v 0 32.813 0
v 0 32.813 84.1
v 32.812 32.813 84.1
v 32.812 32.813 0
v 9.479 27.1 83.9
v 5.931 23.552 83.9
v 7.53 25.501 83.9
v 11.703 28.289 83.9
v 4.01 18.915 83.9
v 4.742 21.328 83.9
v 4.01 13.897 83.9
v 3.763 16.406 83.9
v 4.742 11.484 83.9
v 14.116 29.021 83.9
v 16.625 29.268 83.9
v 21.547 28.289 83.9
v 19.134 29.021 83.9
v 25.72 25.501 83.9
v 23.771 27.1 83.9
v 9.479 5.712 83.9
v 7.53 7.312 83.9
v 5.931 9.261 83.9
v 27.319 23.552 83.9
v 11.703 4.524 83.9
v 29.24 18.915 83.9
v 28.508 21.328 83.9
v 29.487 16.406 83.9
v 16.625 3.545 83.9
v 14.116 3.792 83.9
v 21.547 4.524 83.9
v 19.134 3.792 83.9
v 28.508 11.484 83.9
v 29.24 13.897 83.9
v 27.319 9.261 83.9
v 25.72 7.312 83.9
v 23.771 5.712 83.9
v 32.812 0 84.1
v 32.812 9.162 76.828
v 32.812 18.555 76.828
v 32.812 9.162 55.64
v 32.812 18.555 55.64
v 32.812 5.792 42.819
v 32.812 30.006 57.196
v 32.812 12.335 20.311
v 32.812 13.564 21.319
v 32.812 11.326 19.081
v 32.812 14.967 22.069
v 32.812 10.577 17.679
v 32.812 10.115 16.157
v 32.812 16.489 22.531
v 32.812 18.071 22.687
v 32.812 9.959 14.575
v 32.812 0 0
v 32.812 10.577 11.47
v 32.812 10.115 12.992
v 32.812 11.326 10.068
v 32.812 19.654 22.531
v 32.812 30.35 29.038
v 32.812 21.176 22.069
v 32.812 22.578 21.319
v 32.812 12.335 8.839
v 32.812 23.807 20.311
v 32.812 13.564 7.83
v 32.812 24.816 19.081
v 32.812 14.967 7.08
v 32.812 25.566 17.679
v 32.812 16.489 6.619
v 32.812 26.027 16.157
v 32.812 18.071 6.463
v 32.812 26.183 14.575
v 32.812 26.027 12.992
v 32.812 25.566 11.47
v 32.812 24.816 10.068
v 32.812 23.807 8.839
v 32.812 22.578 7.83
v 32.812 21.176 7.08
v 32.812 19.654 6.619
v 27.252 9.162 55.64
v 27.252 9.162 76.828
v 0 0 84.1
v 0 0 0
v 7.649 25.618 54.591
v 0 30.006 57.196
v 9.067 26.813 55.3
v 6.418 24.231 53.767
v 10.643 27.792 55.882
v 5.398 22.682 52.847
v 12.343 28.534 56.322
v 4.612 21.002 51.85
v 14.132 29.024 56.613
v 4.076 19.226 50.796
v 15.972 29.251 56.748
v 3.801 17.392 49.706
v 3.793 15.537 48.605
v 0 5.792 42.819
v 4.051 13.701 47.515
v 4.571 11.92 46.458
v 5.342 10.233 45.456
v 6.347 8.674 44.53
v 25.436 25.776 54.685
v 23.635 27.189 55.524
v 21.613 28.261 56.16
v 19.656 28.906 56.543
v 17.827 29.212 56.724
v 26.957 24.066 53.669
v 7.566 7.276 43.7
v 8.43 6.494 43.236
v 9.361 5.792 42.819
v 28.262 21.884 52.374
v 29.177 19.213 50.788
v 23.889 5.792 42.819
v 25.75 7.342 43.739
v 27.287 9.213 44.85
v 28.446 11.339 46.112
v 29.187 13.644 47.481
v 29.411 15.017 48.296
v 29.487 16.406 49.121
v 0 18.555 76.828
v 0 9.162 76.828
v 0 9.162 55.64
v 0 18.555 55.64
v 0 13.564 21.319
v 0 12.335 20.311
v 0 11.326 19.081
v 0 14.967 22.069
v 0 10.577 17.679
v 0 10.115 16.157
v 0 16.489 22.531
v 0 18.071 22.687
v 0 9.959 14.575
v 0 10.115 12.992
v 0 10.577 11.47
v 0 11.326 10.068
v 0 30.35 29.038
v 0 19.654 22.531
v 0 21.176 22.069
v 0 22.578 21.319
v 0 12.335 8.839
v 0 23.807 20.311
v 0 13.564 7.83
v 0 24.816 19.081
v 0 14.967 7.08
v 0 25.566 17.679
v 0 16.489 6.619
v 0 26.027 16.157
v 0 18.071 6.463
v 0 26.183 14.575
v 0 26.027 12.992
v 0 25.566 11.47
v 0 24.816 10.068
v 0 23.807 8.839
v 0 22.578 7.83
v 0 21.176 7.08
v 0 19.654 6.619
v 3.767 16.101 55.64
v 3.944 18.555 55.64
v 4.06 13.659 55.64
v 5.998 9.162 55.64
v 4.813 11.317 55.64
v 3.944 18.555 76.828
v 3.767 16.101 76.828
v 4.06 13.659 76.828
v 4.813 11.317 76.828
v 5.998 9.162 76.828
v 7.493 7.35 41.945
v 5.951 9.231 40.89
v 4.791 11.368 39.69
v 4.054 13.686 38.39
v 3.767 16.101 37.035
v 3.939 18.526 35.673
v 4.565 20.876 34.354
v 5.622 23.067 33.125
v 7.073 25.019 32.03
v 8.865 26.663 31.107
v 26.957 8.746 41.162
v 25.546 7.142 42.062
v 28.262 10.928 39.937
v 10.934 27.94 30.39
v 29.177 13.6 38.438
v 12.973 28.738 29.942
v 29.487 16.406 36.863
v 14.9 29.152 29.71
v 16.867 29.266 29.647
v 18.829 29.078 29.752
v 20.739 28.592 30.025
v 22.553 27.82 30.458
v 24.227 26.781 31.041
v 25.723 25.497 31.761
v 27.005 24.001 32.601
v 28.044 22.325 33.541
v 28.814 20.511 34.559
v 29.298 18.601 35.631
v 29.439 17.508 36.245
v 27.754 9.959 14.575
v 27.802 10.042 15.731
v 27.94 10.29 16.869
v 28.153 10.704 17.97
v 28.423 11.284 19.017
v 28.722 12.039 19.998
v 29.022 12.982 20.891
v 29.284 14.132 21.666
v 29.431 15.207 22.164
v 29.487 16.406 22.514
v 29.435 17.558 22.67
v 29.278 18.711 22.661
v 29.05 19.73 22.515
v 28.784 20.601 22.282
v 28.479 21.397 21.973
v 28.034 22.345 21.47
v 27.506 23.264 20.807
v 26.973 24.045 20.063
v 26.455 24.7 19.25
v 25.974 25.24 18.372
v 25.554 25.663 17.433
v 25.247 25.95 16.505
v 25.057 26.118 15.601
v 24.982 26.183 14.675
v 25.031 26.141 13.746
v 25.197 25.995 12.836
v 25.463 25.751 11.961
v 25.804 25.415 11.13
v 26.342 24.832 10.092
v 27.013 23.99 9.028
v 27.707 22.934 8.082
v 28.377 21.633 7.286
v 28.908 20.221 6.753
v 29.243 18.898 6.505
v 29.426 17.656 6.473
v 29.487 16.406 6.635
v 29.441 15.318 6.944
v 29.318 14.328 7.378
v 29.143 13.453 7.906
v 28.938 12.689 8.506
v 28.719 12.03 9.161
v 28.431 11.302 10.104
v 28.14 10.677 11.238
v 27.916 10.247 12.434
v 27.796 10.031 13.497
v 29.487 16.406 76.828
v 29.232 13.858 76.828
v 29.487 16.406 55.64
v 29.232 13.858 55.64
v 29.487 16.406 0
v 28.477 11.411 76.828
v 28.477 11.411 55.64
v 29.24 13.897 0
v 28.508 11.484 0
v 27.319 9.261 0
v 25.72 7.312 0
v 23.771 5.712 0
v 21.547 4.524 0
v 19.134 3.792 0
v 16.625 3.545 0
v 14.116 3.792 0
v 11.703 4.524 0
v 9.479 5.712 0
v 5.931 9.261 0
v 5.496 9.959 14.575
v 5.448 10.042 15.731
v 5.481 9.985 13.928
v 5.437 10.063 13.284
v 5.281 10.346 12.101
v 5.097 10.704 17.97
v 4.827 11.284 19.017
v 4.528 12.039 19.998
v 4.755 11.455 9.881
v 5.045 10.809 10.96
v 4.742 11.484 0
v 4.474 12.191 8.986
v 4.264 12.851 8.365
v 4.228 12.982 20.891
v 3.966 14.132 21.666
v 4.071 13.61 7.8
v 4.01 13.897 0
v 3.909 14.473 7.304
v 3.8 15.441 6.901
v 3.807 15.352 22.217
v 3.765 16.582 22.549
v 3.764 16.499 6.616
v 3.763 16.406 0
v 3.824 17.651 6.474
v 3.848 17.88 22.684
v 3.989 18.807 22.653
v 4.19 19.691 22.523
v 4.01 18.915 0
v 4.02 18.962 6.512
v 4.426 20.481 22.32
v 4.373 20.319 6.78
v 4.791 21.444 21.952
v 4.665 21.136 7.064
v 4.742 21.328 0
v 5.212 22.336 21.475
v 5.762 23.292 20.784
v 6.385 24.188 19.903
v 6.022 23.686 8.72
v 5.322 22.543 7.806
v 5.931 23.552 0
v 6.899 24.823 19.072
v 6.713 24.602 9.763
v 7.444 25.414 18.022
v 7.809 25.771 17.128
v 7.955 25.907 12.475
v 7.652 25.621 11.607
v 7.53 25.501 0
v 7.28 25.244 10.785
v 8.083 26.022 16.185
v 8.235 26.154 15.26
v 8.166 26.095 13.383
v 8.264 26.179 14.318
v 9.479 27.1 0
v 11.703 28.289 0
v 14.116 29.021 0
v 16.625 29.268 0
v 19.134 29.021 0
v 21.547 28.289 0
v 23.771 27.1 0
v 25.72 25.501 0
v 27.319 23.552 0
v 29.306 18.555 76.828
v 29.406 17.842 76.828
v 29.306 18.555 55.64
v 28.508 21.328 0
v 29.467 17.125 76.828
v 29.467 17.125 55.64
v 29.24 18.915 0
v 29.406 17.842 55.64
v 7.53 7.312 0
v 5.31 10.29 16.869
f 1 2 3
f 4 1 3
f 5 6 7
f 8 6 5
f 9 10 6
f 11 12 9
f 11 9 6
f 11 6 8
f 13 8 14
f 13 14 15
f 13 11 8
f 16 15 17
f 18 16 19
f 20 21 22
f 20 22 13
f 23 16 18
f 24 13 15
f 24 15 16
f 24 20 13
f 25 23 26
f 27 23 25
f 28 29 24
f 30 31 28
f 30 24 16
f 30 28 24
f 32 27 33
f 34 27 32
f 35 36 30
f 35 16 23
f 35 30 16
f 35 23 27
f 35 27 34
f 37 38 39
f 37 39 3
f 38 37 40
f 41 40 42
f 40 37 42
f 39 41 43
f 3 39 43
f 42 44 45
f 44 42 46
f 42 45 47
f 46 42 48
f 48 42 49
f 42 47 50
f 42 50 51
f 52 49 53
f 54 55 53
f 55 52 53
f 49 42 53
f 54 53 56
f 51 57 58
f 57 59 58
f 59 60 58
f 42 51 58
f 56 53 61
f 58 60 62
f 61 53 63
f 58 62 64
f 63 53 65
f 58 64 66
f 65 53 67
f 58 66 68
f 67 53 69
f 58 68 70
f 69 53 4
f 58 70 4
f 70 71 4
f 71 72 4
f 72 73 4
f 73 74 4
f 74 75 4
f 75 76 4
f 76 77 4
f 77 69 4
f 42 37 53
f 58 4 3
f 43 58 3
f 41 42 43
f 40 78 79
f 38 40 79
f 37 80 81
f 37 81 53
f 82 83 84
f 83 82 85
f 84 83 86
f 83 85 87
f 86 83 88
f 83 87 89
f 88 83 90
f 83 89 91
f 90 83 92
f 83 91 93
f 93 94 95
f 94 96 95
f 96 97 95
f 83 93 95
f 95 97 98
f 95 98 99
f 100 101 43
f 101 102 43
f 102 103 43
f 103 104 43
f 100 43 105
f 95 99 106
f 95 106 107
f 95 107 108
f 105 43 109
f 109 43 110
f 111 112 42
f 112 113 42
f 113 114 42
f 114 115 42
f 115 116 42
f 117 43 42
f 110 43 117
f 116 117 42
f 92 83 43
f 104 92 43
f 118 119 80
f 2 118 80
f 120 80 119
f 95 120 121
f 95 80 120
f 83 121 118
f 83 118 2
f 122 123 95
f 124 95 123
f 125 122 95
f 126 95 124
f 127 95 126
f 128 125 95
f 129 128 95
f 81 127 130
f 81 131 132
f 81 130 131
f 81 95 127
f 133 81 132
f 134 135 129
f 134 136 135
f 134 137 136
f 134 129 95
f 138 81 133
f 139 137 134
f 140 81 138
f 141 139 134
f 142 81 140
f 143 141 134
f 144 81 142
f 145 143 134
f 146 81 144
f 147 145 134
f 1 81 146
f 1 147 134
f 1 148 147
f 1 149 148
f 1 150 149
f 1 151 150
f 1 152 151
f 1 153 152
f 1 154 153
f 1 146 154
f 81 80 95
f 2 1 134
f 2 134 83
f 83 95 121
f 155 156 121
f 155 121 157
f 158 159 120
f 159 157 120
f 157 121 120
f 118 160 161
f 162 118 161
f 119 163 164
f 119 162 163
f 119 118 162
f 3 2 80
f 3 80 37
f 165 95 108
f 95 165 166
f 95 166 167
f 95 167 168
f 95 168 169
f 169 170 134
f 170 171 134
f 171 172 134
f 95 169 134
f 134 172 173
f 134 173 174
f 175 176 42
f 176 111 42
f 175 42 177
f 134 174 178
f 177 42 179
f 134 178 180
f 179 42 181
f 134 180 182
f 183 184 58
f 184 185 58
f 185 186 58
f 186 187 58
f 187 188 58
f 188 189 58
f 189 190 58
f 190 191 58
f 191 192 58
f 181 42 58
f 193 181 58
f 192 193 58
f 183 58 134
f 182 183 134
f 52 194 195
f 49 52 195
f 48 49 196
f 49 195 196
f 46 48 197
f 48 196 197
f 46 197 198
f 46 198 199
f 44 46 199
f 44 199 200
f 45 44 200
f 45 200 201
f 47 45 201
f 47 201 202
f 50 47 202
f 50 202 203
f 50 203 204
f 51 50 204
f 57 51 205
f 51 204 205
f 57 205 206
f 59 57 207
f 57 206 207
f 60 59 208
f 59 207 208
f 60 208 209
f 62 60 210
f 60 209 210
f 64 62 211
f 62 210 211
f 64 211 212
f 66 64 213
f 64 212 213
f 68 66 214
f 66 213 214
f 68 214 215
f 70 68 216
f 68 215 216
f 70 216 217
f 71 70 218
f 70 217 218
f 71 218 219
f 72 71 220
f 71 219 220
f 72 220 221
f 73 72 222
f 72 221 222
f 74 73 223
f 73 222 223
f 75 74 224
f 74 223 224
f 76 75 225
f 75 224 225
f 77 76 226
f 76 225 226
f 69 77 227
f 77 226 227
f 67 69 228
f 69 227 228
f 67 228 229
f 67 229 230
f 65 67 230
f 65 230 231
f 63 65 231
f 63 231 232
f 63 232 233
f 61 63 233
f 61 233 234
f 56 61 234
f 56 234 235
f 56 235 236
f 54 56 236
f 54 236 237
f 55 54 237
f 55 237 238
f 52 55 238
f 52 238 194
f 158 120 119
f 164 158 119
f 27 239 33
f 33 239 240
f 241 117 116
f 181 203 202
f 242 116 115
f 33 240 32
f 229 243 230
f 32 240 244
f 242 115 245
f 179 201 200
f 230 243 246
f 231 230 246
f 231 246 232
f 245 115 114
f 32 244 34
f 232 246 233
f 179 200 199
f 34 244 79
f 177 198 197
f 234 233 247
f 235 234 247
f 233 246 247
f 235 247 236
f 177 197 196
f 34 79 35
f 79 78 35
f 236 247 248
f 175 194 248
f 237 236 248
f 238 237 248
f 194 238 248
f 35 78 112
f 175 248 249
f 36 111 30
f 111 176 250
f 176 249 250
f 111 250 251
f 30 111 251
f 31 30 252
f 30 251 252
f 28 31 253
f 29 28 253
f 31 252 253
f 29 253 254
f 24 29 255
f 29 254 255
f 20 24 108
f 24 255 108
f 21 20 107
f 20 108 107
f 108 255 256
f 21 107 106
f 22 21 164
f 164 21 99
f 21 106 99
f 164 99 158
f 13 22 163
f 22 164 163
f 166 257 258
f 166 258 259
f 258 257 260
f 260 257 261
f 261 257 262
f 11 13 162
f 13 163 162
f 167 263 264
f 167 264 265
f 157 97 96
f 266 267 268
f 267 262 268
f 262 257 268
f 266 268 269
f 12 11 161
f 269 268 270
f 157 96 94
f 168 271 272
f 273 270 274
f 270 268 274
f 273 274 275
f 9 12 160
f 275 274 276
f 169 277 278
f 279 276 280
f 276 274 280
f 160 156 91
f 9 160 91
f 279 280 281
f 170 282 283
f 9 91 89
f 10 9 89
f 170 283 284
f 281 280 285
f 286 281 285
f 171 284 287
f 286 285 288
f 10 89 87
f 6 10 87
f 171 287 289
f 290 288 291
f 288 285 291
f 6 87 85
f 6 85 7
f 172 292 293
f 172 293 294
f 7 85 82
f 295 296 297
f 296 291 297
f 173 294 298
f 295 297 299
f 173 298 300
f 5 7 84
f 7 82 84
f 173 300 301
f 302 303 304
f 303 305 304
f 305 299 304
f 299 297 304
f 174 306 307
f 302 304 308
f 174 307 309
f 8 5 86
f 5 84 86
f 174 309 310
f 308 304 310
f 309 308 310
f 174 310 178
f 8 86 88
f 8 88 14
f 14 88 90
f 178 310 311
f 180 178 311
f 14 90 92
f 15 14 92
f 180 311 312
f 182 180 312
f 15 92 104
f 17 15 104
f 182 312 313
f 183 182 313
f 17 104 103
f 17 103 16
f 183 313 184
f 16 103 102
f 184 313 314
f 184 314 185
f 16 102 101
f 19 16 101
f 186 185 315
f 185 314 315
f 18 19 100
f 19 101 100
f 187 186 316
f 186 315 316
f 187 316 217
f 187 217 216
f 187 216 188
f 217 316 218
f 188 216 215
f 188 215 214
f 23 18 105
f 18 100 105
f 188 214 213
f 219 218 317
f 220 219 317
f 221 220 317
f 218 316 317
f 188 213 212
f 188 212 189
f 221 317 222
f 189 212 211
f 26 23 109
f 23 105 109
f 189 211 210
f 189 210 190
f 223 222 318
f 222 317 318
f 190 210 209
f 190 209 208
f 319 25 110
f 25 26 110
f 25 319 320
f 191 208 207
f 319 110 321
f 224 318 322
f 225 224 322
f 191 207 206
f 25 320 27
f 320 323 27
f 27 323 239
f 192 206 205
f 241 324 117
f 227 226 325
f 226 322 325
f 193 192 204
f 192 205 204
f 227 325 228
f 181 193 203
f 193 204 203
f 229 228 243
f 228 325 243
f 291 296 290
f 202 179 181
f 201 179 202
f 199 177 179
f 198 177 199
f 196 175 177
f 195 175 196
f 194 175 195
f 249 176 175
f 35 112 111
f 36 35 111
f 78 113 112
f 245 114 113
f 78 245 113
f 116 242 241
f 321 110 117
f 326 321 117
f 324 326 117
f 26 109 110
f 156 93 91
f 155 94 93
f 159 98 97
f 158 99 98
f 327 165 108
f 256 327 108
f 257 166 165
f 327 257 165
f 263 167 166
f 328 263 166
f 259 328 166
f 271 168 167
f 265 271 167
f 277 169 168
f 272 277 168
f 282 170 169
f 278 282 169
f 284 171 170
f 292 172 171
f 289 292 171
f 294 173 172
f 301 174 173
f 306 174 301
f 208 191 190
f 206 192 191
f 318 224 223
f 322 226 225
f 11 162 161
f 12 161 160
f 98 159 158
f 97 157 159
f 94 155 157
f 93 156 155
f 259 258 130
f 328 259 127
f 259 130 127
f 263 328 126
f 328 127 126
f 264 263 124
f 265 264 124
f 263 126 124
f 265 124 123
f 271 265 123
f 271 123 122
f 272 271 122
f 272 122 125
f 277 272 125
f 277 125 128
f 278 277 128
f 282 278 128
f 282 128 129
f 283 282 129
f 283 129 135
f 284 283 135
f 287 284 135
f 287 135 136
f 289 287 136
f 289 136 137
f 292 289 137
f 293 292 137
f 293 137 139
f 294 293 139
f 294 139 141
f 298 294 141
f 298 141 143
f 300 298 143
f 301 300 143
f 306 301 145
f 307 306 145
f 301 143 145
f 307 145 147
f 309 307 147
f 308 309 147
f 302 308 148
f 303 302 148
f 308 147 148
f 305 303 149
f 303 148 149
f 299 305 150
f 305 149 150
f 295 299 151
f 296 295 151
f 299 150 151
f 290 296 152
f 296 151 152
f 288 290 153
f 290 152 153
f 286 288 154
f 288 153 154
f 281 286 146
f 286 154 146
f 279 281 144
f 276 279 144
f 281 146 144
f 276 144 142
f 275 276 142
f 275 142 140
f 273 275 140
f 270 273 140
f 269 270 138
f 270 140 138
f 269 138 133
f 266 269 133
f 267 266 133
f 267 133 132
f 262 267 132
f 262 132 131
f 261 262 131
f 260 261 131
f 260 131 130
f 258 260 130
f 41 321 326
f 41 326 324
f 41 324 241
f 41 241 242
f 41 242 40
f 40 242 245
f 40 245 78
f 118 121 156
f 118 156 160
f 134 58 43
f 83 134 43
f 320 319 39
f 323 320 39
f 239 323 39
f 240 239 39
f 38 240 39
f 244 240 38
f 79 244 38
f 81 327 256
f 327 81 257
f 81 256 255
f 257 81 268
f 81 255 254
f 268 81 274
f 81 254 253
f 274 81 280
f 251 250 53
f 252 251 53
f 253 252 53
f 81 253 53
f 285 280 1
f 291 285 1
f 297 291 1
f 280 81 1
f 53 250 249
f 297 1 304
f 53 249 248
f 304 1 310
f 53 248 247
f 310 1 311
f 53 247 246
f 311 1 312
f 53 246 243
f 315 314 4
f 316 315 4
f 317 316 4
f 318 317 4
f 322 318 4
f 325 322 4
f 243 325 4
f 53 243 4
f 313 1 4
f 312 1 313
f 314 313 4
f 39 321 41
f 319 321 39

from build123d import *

# Parameters (mm, degrees)
F0_W      = 32.8124985099
F0_H      = 32.8125022352
F1_DEPTH  = 84.1
F2_R      = 18.0617046785
F3_DEPTH  = 25
F4_R      = 12.861682219
F5_DEPTH  = 83.9
F6_R      = 12.5847574658
F7_DEPTH  = 95.8
F9_DEPTH  = 47.1
F10_R     = 8.1119683514
F11_DEPTH = 55.8
F12_W     = 9.392676875
F12_H     = 21.1881324649
F13_DEPTH = 42.9


with BuildPart() as f1:
    # F0 (on Top) → F1 (new body)
    with BuildSketch(Plane.XY):
        with Locations((16.4062492549, 16.4062511176)):
            Rectangle(F0_W, F0_H)
    extrude(amount=F1_DEPTH)

    # F2 (on Front) → F3 (cut)
    with BuildSketch(Plane.XZ):
        with Locations((-41.3749553263, 38.6410132051)):
            Circle(F2_R)
    extrude(amount=-F3_DEPTH, mode=Mode.SUBTRACT)

    # F4 (on face) → F5 (cut)
    with BuildSketch(Plane(origin=(0, 0, 0), x_dir=(1, 0, 0), z_dir=(0, 0, -1))):
        with Locations((16.6250001639, -16.4062511176)):
            Circle(F4_R)
    extrude(amount=-F5_DEPTH, mode=Mode.SUBTRACT)

    # F6 (on face) → F7 (cut)
    with BuildSketch(Plane(origin=(0, 0, 83.9), x_dir=(1, 0, 0), z_dir=(0, 0, -1))):
        with Locations((16.6250001639, -16.4062511176)):
            Circle(F6_R)
    extrude(amount=F7_DEPTH, mode=Mode.SUBTRACT)

    # F8 (on face) → F9 (cut)
    with BuildSketch(Plane.YZ.offset(32.8124985099)):
        Polygon((30.0061684702, 57.1961463892), (5.7924445118, 42.8192554511), (30.3500592709, 29.0380008519), align=None)
    extrude(amount=-F9_DEPTH, mode=Mode.SUBTRACT)

    # F10 (on face) → F11 (cut)
    with BuildSketch(Plane(origin=(0, 0, 0), x_dir=(0, -1, 0), z_dir=(-1, 0, 0))):
        with Locations((-18.0712518913, 14.5746218041)):
            Circle(F10_R)
    extrude(amount=-F11_DEPTH, mode=Mode.SUBTRACT)

    # F12 (on face) → F13 (cut)
    with BuildSketch(Plane(origin=(0, 0, 0), x_dir=(0, -1, 0), z_dir=(-1, 0, 0))):
        with Locations((-13.8582708314, 66.2343464792)):
            Rectangle(F12_W, F12_H)
    extrude(amount=-F13_DEPTH, mode=Mode.SUBTRACT)


solid = f1.part
